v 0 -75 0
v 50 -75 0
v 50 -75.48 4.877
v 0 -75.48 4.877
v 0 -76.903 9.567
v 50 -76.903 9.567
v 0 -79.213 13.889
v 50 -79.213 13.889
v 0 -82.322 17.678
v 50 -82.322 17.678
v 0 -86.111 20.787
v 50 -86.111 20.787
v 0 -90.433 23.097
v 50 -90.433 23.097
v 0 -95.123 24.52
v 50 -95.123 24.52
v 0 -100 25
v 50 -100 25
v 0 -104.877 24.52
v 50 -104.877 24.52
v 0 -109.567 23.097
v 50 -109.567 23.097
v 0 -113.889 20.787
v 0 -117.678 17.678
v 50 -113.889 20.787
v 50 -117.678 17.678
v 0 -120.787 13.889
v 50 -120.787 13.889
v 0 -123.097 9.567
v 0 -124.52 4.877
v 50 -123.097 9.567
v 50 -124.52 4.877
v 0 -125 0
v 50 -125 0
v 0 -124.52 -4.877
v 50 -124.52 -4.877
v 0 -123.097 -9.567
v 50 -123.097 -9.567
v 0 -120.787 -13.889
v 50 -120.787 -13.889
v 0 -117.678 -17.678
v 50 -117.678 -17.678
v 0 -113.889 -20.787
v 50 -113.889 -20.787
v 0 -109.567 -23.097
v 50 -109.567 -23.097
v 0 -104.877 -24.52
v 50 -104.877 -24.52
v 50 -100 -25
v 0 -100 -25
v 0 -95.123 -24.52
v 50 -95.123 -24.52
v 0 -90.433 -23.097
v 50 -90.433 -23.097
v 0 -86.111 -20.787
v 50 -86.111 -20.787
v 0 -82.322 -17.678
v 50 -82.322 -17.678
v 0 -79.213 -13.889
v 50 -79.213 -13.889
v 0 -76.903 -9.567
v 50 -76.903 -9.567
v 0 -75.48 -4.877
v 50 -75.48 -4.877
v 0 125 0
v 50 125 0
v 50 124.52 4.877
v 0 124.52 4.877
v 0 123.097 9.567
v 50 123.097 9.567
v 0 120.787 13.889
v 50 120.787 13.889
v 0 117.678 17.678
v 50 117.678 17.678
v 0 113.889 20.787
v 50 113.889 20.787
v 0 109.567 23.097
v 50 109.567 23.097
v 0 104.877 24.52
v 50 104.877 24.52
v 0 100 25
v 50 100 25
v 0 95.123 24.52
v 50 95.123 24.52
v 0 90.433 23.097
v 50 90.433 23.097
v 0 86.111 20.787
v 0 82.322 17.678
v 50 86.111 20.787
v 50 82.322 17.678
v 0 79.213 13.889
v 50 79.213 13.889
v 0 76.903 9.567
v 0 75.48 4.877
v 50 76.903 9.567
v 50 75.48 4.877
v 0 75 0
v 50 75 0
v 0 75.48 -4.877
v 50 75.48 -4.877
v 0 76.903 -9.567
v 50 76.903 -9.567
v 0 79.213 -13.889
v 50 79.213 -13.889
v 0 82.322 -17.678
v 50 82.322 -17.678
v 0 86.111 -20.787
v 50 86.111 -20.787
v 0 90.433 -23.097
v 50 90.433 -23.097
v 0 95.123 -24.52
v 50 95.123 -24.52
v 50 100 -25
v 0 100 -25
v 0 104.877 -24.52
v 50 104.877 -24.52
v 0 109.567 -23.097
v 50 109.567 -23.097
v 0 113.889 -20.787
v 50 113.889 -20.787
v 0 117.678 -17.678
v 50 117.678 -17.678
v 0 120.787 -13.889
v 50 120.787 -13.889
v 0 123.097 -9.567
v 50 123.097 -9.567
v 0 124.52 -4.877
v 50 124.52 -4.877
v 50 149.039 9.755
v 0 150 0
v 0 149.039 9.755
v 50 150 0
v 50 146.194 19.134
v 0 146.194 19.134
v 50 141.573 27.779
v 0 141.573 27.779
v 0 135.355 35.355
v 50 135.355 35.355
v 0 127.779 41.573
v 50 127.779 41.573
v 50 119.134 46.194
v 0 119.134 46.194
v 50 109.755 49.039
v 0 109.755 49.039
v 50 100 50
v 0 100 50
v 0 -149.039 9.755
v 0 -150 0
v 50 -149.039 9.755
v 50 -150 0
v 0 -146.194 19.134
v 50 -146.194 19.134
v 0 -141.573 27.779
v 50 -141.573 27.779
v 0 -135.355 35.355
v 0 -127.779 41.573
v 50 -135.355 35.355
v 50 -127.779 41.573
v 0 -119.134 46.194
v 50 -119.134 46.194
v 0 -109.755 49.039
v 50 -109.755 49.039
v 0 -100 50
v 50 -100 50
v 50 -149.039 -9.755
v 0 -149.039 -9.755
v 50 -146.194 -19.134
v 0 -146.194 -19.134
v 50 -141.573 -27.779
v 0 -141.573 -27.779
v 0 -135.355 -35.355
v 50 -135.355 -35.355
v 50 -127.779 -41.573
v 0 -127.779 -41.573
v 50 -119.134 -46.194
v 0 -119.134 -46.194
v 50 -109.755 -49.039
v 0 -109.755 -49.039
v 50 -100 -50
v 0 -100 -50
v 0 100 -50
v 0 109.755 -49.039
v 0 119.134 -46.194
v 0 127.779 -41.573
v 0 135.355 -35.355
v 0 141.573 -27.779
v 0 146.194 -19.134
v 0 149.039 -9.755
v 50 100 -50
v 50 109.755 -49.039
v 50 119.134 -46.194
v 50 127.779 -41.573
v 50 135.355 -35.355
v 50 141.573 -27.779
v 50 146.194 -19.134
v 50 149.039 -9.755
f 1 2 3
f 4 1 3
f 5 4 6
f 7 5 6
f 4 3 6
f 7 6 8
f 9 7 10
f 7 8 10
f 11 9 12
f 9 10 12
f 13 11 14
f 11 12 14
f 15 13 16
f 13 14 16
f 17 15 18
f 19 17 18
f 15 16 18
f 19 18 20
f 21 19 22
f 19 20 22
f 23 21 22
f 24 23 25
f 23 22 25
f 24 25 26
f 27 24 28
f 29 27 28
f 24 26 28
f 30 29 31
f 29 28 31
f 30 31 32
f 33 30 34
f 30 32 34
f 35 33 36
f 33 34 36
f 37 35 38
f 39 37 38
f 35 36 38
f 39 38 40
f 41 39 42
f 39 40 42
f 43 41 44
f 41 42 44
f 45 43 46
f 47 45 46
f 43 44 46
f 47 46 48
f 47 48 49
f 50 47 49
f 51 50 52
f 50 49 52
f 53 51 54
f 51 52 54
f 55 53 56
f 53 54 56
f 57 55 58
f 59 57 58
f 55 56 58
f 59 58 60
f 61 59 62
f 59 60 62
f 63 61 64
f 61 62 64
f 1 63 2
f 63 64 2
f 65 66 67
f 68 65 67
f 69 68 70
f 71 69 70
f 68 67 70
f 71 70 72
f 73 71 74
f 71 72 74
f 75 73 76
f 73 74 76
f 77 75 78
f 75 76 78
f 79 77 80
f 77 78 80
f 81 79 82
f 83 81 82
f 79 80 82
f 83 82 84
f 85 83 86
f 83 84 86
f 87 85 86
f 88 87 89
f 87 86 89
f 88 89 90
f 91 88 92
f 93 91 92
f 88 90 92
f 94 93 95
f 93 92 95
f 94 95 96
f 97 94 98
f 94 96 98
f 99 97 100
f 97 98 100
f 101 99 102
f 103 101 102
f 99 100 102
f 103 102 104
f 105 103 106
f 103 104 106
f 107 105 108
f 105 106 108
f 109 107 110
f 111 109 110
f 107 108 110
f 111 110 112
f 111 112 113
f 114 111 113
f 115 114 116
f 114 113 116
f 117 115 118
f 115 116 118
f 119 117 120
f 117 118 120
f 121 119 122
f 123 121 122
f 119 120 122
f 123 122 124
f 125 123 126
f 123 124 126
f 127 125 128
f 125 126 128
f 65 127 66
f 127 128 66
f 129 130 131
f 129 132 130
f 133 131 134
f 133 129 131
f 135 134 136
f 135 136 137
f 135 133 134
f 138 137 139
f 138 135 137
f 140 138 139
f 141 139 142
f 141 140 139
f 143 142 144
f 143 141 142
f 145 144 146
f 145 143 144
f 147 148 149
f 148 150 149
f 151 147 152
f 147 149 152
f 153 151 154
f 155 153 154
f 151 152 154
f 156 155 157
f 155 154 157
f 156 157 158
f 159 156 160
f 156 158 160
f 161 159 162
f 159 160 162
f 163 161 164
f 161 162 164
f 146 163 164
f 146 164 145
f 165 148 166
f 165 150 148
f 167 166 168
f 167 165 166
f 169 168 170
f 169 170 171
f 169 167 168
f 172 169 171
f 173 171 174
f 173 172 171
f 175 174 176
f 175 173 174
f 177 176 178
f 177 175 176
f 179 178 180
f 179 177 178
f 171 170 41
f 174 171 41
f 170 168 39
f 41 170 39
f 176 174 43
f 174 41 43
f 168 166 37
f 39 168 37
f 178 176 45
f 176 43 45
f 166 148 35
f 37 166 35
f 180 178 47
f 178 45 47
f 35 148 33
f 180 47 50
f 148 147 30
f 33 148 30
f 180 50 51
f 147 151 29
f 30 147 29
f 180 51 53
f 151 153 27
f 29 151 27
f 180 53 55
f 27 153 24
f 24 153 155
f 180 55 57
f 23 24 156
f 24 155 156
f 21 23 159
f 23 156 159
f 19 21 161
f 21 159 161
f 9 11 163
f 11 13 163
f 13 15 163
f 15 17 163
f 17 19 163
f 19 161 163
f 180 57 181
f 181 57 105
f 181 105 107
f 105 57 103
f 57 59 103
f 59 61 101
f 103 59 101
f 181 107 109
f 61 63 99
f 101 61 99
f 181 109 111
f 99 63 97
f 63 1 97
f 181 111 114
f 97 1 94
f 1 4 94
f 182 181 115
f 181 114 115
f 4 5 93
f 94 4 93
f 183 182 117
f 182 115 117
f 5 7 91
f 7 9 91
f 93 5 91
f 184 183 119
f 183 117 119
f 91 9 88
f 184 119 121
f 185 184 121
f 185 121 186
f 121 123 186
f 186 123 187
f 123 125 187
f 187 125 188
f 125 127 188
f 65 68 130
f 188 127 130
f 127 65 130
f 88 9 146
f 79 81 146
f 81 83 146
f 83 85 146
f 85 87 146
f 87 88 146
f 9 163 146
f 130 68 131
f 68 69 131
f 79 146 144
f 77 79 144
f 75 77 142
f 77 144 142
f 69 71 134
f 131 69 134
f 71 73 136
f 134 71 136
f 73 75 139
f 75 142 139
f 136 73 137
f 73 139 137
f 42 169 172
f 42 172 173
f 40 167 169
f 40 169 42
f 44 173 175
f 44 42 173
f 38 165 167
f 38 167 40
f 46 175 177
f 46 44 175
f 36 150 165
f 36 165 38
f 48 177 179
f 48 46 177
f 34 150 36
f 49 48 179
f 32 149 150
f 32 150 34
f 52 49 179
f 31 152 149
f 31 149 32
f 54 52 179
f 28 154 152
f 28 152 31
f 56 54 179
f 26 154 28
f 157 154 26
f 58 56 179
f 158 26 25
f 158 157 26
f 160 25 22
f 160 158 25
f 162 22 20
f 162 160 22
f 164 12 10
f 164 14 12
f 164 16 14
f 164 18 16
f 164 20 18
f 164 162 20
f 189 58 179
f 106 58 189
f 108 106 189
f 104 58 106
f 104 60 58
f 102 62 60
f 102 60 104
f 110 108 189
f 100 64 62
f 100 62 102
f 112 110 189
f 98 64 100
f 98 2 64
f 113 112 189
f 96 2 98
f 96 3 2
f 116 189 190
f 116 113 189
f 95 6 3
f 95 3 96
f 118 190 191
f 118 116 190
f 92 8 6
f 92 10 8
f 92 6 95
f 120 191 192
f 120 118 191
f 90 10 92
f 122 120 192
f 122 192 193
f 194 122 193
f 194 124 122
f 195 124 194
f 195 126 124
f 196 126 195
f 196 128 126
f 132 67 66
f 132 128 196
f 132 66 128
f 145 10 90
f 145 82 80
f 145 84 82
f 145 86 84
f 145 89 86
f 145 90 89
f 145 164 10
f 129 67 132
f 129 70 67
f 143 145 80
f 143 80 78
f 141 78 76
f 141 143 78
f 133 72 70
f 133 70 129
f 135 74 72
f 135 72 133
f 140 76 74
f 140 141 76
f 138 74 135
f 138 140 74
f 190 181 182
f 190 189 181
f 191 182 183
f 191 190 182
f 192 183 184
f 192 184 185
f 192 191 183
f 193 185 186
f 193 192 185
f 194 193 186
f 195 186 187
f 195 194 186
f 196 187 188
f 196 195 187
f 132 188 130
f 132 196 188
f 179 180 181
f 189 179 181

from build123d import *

# Parameters (mm, degrees)
F0_W     = 300
F0_H     = 100
F1_DEPTH = 50
F2_R     = 49.99999
F3_R     = 25
F4_DEPTH = 50


# Not quite as in the source:
# - a fillet or chamfer is up to 0.001 mm smaller than in the source, because OpenCascade refuses the exact size


with BuildPart() as f1:
    # F0 (on Right) → F1 (new body)
    with BuildSketch(Plane.YZ):
        Rectangle(F0_W, F0_H)
    extrude(amount=F1_DEPTH)

    # F2 (radius 50 in the source; OpenCascade refuses exactly that, so slightly less here)
    f2_edges = [f1.edges().sort_by_distance(p)[0] for p in [
        (25, -150, 50),
        (25, -150, -50),
        (25, 150, 50),
        (25, 150, -50),
    ]]
    fillet(f2_edges, radius=F2_R)

    # F3 (on face) → F4 (cut)
    with BuildSketch(Plane.YZ.offset(50)):
        with Locations((-100, 0)):
            Circle(F3_R)
        with Locations((100, 0)):
            Circle(F3_R)
    extrude(amount=-F4_DEPTH, mode=Mode.SUBTRACT)


solid = f1.part
